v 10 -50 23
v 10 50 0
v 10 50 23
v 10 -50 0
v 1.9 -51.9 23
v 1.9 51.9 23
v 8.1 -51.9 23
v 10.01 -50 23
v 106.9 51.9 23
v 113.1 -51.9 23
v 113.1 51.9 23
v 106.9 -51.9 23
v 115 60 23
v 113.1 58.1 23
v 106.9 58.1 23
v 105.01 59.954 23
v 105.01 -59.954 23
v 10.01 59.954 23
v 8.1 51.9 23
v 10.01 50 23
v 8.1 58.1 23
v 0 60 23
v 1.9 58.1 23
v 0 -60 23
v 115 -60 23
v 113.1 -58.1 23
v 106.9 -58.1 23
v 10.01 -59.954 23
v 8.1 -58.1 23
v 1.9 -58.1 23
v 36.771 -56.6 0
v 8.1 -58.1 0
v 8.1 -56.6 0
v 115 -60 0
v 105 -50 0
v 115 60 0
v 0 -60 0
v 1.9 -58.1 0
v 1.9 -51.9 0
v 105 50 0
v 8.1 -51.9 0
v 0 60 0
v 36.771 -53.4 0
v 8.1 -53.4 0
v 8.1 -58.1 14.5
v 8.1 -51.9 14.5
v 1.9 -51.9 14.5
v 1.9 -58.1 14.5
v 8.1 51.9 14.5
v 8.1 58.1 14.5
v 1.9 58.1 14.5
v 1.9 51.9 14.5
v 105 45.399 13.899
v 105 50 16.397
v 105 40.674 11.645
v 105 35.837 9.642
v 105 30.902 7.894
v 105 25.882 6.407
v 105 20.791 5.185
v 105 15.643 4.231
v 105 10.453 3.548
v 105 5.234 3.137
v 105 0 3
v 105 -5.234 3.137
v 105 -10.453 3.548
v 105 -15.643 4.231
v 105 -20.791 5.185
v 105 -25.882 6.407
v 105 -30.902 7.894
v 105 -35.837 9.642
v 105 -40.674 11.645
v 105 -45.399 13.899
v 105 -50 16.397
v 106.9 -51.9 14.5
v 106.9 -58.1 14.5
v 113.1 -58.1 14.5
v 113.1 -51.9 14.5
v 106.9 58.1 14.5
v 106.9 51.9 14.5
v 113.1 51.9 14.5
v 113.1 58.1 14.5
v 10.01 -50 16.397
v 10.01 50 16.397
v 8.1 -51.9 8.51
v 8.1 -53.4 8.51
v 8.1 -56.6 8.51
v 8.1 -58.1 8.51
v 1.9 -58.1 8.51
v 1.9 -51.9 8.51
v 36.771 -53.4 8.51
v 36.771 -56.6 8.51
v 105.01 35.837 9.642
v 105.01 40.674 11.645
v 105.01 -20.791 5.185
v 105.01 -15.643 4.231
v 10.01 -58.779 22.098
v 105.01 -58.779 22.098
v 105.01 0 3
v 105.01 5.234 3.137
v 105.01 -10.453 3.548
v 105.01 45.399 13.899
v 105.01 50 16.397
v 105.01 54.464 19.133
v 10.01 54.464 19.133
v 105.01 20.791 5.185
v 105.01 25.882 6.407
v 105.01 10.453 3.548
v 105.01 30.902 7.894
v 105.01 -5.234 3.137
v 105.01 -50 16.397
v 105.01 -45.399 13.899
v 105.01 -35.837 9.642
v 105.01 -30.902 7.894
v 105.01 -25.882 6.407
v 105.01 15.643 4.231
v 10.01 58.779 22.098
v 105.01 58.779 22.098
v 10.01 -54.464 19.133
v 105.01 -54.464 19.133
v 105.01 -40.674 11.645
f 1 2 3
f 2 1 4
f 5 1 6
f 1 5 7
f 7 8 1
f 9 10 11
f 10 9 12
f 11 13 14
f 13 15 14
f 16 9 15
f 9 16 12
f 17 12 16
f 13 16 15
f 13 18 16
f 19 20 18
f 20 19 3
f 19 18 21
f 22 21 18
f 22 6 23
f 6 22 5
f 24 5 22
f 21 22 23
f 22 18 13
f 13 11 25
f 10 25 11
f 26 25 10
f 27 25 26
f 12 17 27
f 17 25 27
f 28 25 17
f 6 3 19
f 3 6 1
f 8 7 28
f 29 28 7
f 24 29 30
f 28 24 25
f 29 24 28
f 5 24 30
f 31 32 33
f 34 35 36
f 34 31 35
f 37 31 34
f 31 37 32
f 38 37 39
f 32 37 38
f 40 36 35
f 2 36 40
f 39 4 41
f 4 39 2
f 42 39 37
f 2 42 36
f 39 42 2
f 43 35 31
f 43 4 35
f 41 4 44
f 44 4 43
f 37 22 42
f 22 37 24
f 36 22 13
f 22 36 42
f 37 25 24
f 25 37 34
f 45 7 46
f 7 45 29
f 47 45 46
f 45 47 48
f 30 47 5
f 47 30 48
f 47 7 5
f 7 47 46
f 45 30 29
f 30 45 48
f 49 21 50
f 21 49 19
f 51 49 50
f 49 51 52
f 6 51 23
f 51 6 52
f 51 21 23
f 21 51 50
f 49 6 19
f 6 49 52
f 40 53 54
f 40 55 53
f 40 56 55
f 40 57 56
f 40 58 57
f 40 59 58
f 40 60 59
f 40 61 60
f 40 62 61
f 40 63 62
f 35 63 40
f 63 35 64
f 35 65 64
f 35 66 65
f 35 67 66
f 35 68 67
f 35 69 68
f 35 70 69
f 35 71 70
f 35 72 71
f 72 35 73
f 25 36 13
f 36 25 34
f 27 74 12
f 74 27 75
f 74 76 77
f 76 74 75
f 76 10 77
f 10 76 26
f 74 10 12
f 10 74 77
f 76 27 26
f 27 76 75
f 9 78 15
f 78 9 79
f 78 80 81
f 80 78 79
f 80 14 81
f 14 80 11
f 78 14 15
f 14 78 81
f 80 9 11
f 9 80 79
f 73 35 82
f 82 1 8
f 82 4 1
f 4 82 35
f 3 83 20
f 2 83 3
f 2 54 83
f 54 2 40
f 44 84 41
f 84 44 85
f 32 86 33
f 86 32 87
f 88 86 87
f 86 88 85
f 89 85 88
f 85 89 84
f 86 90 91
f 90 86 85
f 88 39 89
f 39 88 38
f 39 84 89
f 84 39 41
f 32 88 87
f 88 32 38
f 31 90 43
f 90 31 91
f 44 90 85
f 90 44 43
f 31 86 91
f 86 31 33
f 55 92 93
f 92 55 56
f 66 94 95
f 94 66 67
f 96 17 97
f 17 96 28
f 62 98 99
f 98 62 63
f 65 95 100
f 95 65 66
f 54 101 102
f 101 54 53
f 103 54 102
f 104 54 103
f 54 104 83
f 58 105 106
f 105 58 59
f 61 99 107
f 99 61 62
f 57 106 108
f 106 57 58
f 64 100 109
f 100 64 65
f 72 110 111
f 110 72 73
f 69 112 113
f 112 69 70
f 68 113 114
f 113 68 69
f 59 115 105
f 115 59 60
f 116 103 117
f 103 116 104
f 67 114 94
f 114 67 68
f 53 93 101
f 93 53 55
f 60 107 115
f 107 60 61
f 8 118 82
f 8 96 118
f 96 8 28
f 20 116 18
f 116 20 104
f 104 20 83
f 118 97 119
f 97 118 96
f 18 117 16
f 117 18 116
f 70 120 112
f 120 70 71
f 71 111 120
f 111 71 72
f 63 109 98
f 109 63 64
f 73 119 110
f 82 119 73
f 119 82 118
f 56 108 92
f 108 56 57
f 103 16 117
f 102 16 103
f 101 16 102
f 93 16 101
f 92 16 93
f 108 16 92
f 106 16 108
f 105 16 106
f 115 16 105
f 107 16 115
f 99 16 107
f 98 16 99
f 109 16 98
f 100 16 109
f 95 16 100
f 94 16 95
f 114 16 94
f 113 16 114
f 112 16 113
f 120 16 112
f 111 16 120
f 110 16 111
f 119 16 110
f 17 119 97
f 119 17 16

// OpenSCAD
/*
   Spool Shelf - by Mike Koss (August, 2013)

   Hold one or more spools with a stackable shelving unit.
*/

E = 0.01;
GAP = 0.1;

PART = "shelf"; // [shelf, post, post-mirror]

SPOOLS = 1;

SPOOL_R = 100;
SPOOL_W = 75;
SPOOL_GAP = 10;
SPOOL_CLEARANCE = 3;

SHELF_WIDTH = SPOOLS * (SPOOL_W + SPOOL_GAP) + SPOOL_GAP;
RAIL_SEP = SPOOL_R;

END_WIDTH = 10;
RAIL_WIDTH = END_WIDTH;
END_DEPTH = RAIL_SEP + 2 * RAIL_WIDTH;
END_HEIGHT = SPOOL_CLEARANCE + SPOOL_R - sqrt(pow(SPOOL_R, 2) - pow(END_DEPTH / 2, 2));

RAIL_CENTER = RAIL_SEP / 2 + RAIL_WIDTH / 2;

POST_WIDTH = END_WIDTH - 4;
POST_HOLE = END_HEIGHT / 2 - 3;
BRACE_DEPTH = POST_WIDTH / 2;
BRACE_HEIGHT = SPOOL_R * 2 / 7;
POST_HEIGHT = SPOOL_R * 2 + BRACE_HEIGHT + POST_HOLE - SPOOL_GAP;

module shelf() {
  difference() {
    union() {
      shelf_end();
      translate([2 * END_WIDTH + SHELF_WIDTH, 0, 0])
        reflect_x()
          shelf_end();
      translate([END_WIDTH, -RAIL_CENTER, 0])
        rail();
      translate([END_WIDTH, RAIL_CENTER, 0])
        rail();
    }
    translate([END_WIDTH + E, 0, 0])
      spool(SHELF_WIDTH);
    # translate([END_WIDTH / 2, -RAIL_CENTER, POST_HOLE / 2])
      brace_slot();
  }
  % spools();
}

module brace_slot() {
  cube([POST_WIDTH + 2 * GAP, POST_WIDTH + 2 * GAP, POST_HOLE + 2 * E], center=true);
  translate([POST_WIDTH / 2 + BRACE_HEIGHT / 2 + GAP, 0, 0])
    cube([BRACE_HEIGHT + 2 * GAP, BRACE_DEPTH + 2 * GAP, POST_HOLE + 2 * E], center=true);
}

module rail() {
  translate([-E, -RAIL_WIDTH / 2, 0])
    cube([SHELF_WIDTH + 2 * E, RAIL_WIDTH, END_HEIGHT]);
}

module shelf_end() {
  difference() {
    translate([0, -END_DEPTH / 2, 0])
      cube([END_WIDTH, END_DEPTH, END_HEIGHT]);
  translate([END_WIDTH / 2, -RAIL_CENTER, END_HEIGHT])
    cube([POST_WIDTH + 2 * GAP, POST_WIDTH + 2 * GAP, 2 * POST_HOLE], center=true);
  translate([END_WIDTH / 2, RAIL_CENTER, END_HEIGHT])
    cube([POST_WIDTH + 2 * GAP, POST_WIDTH + 2 * GAP, 2 * POST_HOLE], center=true);
  }
  % translate([END_WIDTH / 2, -RAIL_CENTER, END_HEIGHT - POST_HOLE])
      post();
  % translate([END_WIDTH / 2, +RAIL_CENTER, END_HEIGHT - POST_HOLE])
      reflect_y()
        post();
}

module spool(width=SPOOL_W) {
  translate([0, 0, SPOOL_R + SPOOL_CLEARANCE])
    rotate(a=90, v=[0, 1, 0])
      cylinder(r=SPOOL_R, h=width, $fa=3);
}

module spools() {
  for (i = [0 : SPOOLS-1]) {
    translate([END_WIDTH + SPOOL_GAP + i * (SPOOL_W + SPOOL_GAP), 0, 0])
      spool();
  }
}

module post() {
  translate([0, 0, POST_HEIGHT / 2])
    cube([POST_WIDTH, POST_WIDTH, POST_HEIGHT], center=true);
  translate([POST_WIDTH / 2 - E, 0, POST_HEIGHT])
    brace();
  rotate(a=90, v=[0, 0, 1])
    translate([POST_WIDTH / 2 - E, (POST_WIDTH - BRACE_DEPTH) / 2, 0])
      reflect_z()
        brace();
}

module brace() {
  rotate(a=-90, v=[1, 0, 0])
    linear_extrude(BRACE_DEPTH, center=true)
      polygon([[0, 0], [BRACE_HEIGHT, 0], [0, BRACE_HEIGHT]]);
}

module reflect_x() {
  multmatrix(m=[[-1, 0, 0, 0],
                [0, 1, 0, 0],
                [0, 0, 1, 0],
                [0, 0, 0, 1]])
    child(0);
}

module reflect_y() {
  multmatrix(m=[[1, 0, 0, 0],
                [0, -1, 0, 0],
                [0, 0, 1, 0],
                [0, 0, 0, 1]])
    child(0);
}

module reflect_z() {
  multmatrix(m=[[1, 0, 0, 0],
                [0, 1, 0, 0],
                [0, 0, -1, 0],
                [0, 0, 0, 1]])
    child(0);
}

module print_post() {
  translate([POST_HEIGHT / 2, 0, POST_WIDTH / 2])
    rotate(a=-90, v=[0, 1, 0])
      post();
}

if (PART == "shelf") {
  shelf();
}

if (PART == "post") {
  print_post();
}

if (PART == "post-mirror") {
  reflect_y() print_post();
}
